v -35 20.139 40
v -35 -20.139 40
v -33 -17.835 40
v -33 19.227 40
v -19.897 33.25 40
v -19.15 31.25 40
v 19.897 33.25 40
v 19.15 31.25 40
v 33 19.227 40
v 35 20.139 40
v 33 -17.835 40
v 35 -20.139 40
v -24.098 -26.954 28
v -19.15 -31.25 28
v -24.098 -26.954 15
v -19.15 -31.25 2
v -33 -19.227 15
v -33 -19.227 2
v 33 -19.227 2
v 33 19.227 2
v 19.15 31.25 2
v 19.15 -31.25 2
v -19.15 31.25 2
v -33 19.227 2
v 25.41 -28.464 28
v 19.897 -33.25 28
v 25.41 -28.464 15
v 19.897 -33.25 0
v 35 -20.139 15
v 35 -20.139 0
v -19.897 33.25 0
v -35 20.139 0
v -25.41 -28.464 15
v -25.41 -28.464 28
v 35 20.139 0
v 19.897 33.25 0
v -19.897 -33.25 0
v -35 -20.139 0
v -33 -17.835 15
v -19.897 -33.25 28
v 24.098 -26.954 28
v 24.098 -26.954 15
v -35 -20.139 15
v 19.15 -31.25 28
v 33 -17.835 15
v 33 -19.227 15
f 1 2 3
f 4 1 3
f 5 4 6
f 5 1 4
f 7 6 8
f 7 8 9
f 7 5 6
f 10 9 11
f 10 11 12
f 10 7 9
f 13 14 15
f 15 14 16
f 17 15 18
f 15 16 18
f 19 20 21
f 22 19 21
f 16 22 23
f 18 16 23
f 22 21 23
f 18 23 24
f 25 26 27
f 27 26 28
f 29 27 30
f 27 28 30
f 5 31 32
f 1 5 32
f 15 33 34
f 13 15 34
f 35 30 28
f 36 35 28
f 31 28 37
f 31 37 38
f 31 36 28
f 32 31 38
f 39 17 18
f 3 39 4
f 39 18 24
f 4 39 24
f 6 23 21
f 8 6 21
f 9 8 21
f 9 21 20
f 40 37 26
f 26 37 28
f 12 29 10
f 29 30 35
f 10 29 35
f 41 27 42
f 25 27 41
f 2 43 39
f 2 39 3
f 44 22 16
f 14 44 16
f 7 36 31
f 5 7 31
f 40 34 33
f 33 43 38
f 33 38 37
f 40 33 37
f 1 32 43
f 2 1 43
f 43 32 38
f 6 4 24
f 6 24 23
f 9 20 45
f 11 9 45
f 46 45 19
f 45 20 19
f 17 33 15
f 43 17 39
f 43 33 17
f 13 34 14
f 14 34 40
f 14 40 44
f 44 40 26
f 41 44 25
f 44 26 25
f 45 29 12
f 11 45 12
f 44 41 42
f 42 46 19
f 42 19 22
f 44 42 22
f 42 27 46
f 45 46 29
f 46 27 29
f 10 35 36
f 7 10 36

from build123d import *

# Parameters (mm, degrees)
BOSS_EXTRUDE1_DEPTH = 40
CUT_EXTRUDE1_REACH  = 97.146
SKETCH2_W           = 12.7
SKETCH2_H           = 36.204742391
CUT_EXTRUDE2_REACH  = 87.131
SKETCH3_W           = 56.49525371
SKETCH3_H           = 18.41246495
BOSS_EXTRUDE3_DEPTH = 2


with BuildPart() as part:
    # Sketch1 → Boss-Extrude1 (new body)
    with BuildSketch(Plane.XY):
        Polygon((-19.897004387, 33.25), (-35, 20.138954141), (-35, -20.138954141), (-19.897004387, -33.25), (19.897004387, -33.25), (35, -20.138954141), (35, 20.138954141), (19.897004387, 33.25), align=None)
        Polygon((19.15, 31.25), (33, 19.226690863), (33, -19.226690863), (19.15, -31.25), (-19.15, -31.25), (-33, -19.226690863), (-33, 19.226690863), (-19.15, 31.25), align=None, mode=Mode.SUBTRACT)
    extrude(amount=BOSS_EXTRUDE1_DEPTH)

    # Sketch2 → Cut-Extrude1 (cut, up to next)
    with BuildSketch(Plane(origin=(25.010799593, -28.810668547, 0), x_dir=(0.7551497806531032, 0.6555522929405175, 0), z_dir=(0.6555522929405175, -0.7551497806531032, 0)), mode=Mode.PRIVATE) as cut_extrude1_sk1:
        with Locations((6.878104758, 33.102371196)):
            Rectangle(SKETCH2_W, SKETCH2_H)
    cut_extrude1_tool1 = extrude(cut_extrude1_sk1.sketch, amount=-CUT_EXTRUDE1_REACH, mode=Mode.PRIVATE) & part.part
    cut_extrude1 = cut_extrude1_tool1.solids().sort_by_distance((30.204799, -24.301711, 33.102371))[0]
    add(cut_extrude1, mode=Mode.SUBTRACT)

    # Mirror1: Cut-Extrude1 across plane
    add(cut_extrude1.mirror(Plane(origin=(0, 0, 0), x_dir=(0, 0, 1), z_dir=(1, 0, 0))), mode=Mode.SUBTRACT)

    # Sketch3 → Cut-Extrude2 (cut, up to next)
    with BuildSketch(Plane.XZ.offset(33.25), mode=Mode.PRIVATE) as cut_extrude2_sk1:
        with Locations((-0.191025239, 37.206232475)):
            Rectangle(SKETCH3_W, SKETCH3_H)
    cut_extrude2_tool1 = extrude(cut_extrude2_sk1.sketch, amount=-CUT_EXTRUDE2_REACH, mode=Mode.PRIVATE) & part.part
    add(cut_extrude2_tool1.solids().sort_by_distance((-0.191025, -33.25, 37.206232))[0], mode=Mode.SUBTRACT)

    # Sketch4 → Boss-Extrude3 (add)
    with BuildSketch(Plane.XY):
        Polygon((19.15, 31.25), (33, 19.226690863), (33, -19.226690863), (19.15, -31.25), (-19.15, -31.25), (-33, -19.226690863), (-33, 19.226690863), (-19.15, 31.25), align=None)
    extrude(amount=BOSS_EXTRUDE3_DEPTH)


solid = part.part
